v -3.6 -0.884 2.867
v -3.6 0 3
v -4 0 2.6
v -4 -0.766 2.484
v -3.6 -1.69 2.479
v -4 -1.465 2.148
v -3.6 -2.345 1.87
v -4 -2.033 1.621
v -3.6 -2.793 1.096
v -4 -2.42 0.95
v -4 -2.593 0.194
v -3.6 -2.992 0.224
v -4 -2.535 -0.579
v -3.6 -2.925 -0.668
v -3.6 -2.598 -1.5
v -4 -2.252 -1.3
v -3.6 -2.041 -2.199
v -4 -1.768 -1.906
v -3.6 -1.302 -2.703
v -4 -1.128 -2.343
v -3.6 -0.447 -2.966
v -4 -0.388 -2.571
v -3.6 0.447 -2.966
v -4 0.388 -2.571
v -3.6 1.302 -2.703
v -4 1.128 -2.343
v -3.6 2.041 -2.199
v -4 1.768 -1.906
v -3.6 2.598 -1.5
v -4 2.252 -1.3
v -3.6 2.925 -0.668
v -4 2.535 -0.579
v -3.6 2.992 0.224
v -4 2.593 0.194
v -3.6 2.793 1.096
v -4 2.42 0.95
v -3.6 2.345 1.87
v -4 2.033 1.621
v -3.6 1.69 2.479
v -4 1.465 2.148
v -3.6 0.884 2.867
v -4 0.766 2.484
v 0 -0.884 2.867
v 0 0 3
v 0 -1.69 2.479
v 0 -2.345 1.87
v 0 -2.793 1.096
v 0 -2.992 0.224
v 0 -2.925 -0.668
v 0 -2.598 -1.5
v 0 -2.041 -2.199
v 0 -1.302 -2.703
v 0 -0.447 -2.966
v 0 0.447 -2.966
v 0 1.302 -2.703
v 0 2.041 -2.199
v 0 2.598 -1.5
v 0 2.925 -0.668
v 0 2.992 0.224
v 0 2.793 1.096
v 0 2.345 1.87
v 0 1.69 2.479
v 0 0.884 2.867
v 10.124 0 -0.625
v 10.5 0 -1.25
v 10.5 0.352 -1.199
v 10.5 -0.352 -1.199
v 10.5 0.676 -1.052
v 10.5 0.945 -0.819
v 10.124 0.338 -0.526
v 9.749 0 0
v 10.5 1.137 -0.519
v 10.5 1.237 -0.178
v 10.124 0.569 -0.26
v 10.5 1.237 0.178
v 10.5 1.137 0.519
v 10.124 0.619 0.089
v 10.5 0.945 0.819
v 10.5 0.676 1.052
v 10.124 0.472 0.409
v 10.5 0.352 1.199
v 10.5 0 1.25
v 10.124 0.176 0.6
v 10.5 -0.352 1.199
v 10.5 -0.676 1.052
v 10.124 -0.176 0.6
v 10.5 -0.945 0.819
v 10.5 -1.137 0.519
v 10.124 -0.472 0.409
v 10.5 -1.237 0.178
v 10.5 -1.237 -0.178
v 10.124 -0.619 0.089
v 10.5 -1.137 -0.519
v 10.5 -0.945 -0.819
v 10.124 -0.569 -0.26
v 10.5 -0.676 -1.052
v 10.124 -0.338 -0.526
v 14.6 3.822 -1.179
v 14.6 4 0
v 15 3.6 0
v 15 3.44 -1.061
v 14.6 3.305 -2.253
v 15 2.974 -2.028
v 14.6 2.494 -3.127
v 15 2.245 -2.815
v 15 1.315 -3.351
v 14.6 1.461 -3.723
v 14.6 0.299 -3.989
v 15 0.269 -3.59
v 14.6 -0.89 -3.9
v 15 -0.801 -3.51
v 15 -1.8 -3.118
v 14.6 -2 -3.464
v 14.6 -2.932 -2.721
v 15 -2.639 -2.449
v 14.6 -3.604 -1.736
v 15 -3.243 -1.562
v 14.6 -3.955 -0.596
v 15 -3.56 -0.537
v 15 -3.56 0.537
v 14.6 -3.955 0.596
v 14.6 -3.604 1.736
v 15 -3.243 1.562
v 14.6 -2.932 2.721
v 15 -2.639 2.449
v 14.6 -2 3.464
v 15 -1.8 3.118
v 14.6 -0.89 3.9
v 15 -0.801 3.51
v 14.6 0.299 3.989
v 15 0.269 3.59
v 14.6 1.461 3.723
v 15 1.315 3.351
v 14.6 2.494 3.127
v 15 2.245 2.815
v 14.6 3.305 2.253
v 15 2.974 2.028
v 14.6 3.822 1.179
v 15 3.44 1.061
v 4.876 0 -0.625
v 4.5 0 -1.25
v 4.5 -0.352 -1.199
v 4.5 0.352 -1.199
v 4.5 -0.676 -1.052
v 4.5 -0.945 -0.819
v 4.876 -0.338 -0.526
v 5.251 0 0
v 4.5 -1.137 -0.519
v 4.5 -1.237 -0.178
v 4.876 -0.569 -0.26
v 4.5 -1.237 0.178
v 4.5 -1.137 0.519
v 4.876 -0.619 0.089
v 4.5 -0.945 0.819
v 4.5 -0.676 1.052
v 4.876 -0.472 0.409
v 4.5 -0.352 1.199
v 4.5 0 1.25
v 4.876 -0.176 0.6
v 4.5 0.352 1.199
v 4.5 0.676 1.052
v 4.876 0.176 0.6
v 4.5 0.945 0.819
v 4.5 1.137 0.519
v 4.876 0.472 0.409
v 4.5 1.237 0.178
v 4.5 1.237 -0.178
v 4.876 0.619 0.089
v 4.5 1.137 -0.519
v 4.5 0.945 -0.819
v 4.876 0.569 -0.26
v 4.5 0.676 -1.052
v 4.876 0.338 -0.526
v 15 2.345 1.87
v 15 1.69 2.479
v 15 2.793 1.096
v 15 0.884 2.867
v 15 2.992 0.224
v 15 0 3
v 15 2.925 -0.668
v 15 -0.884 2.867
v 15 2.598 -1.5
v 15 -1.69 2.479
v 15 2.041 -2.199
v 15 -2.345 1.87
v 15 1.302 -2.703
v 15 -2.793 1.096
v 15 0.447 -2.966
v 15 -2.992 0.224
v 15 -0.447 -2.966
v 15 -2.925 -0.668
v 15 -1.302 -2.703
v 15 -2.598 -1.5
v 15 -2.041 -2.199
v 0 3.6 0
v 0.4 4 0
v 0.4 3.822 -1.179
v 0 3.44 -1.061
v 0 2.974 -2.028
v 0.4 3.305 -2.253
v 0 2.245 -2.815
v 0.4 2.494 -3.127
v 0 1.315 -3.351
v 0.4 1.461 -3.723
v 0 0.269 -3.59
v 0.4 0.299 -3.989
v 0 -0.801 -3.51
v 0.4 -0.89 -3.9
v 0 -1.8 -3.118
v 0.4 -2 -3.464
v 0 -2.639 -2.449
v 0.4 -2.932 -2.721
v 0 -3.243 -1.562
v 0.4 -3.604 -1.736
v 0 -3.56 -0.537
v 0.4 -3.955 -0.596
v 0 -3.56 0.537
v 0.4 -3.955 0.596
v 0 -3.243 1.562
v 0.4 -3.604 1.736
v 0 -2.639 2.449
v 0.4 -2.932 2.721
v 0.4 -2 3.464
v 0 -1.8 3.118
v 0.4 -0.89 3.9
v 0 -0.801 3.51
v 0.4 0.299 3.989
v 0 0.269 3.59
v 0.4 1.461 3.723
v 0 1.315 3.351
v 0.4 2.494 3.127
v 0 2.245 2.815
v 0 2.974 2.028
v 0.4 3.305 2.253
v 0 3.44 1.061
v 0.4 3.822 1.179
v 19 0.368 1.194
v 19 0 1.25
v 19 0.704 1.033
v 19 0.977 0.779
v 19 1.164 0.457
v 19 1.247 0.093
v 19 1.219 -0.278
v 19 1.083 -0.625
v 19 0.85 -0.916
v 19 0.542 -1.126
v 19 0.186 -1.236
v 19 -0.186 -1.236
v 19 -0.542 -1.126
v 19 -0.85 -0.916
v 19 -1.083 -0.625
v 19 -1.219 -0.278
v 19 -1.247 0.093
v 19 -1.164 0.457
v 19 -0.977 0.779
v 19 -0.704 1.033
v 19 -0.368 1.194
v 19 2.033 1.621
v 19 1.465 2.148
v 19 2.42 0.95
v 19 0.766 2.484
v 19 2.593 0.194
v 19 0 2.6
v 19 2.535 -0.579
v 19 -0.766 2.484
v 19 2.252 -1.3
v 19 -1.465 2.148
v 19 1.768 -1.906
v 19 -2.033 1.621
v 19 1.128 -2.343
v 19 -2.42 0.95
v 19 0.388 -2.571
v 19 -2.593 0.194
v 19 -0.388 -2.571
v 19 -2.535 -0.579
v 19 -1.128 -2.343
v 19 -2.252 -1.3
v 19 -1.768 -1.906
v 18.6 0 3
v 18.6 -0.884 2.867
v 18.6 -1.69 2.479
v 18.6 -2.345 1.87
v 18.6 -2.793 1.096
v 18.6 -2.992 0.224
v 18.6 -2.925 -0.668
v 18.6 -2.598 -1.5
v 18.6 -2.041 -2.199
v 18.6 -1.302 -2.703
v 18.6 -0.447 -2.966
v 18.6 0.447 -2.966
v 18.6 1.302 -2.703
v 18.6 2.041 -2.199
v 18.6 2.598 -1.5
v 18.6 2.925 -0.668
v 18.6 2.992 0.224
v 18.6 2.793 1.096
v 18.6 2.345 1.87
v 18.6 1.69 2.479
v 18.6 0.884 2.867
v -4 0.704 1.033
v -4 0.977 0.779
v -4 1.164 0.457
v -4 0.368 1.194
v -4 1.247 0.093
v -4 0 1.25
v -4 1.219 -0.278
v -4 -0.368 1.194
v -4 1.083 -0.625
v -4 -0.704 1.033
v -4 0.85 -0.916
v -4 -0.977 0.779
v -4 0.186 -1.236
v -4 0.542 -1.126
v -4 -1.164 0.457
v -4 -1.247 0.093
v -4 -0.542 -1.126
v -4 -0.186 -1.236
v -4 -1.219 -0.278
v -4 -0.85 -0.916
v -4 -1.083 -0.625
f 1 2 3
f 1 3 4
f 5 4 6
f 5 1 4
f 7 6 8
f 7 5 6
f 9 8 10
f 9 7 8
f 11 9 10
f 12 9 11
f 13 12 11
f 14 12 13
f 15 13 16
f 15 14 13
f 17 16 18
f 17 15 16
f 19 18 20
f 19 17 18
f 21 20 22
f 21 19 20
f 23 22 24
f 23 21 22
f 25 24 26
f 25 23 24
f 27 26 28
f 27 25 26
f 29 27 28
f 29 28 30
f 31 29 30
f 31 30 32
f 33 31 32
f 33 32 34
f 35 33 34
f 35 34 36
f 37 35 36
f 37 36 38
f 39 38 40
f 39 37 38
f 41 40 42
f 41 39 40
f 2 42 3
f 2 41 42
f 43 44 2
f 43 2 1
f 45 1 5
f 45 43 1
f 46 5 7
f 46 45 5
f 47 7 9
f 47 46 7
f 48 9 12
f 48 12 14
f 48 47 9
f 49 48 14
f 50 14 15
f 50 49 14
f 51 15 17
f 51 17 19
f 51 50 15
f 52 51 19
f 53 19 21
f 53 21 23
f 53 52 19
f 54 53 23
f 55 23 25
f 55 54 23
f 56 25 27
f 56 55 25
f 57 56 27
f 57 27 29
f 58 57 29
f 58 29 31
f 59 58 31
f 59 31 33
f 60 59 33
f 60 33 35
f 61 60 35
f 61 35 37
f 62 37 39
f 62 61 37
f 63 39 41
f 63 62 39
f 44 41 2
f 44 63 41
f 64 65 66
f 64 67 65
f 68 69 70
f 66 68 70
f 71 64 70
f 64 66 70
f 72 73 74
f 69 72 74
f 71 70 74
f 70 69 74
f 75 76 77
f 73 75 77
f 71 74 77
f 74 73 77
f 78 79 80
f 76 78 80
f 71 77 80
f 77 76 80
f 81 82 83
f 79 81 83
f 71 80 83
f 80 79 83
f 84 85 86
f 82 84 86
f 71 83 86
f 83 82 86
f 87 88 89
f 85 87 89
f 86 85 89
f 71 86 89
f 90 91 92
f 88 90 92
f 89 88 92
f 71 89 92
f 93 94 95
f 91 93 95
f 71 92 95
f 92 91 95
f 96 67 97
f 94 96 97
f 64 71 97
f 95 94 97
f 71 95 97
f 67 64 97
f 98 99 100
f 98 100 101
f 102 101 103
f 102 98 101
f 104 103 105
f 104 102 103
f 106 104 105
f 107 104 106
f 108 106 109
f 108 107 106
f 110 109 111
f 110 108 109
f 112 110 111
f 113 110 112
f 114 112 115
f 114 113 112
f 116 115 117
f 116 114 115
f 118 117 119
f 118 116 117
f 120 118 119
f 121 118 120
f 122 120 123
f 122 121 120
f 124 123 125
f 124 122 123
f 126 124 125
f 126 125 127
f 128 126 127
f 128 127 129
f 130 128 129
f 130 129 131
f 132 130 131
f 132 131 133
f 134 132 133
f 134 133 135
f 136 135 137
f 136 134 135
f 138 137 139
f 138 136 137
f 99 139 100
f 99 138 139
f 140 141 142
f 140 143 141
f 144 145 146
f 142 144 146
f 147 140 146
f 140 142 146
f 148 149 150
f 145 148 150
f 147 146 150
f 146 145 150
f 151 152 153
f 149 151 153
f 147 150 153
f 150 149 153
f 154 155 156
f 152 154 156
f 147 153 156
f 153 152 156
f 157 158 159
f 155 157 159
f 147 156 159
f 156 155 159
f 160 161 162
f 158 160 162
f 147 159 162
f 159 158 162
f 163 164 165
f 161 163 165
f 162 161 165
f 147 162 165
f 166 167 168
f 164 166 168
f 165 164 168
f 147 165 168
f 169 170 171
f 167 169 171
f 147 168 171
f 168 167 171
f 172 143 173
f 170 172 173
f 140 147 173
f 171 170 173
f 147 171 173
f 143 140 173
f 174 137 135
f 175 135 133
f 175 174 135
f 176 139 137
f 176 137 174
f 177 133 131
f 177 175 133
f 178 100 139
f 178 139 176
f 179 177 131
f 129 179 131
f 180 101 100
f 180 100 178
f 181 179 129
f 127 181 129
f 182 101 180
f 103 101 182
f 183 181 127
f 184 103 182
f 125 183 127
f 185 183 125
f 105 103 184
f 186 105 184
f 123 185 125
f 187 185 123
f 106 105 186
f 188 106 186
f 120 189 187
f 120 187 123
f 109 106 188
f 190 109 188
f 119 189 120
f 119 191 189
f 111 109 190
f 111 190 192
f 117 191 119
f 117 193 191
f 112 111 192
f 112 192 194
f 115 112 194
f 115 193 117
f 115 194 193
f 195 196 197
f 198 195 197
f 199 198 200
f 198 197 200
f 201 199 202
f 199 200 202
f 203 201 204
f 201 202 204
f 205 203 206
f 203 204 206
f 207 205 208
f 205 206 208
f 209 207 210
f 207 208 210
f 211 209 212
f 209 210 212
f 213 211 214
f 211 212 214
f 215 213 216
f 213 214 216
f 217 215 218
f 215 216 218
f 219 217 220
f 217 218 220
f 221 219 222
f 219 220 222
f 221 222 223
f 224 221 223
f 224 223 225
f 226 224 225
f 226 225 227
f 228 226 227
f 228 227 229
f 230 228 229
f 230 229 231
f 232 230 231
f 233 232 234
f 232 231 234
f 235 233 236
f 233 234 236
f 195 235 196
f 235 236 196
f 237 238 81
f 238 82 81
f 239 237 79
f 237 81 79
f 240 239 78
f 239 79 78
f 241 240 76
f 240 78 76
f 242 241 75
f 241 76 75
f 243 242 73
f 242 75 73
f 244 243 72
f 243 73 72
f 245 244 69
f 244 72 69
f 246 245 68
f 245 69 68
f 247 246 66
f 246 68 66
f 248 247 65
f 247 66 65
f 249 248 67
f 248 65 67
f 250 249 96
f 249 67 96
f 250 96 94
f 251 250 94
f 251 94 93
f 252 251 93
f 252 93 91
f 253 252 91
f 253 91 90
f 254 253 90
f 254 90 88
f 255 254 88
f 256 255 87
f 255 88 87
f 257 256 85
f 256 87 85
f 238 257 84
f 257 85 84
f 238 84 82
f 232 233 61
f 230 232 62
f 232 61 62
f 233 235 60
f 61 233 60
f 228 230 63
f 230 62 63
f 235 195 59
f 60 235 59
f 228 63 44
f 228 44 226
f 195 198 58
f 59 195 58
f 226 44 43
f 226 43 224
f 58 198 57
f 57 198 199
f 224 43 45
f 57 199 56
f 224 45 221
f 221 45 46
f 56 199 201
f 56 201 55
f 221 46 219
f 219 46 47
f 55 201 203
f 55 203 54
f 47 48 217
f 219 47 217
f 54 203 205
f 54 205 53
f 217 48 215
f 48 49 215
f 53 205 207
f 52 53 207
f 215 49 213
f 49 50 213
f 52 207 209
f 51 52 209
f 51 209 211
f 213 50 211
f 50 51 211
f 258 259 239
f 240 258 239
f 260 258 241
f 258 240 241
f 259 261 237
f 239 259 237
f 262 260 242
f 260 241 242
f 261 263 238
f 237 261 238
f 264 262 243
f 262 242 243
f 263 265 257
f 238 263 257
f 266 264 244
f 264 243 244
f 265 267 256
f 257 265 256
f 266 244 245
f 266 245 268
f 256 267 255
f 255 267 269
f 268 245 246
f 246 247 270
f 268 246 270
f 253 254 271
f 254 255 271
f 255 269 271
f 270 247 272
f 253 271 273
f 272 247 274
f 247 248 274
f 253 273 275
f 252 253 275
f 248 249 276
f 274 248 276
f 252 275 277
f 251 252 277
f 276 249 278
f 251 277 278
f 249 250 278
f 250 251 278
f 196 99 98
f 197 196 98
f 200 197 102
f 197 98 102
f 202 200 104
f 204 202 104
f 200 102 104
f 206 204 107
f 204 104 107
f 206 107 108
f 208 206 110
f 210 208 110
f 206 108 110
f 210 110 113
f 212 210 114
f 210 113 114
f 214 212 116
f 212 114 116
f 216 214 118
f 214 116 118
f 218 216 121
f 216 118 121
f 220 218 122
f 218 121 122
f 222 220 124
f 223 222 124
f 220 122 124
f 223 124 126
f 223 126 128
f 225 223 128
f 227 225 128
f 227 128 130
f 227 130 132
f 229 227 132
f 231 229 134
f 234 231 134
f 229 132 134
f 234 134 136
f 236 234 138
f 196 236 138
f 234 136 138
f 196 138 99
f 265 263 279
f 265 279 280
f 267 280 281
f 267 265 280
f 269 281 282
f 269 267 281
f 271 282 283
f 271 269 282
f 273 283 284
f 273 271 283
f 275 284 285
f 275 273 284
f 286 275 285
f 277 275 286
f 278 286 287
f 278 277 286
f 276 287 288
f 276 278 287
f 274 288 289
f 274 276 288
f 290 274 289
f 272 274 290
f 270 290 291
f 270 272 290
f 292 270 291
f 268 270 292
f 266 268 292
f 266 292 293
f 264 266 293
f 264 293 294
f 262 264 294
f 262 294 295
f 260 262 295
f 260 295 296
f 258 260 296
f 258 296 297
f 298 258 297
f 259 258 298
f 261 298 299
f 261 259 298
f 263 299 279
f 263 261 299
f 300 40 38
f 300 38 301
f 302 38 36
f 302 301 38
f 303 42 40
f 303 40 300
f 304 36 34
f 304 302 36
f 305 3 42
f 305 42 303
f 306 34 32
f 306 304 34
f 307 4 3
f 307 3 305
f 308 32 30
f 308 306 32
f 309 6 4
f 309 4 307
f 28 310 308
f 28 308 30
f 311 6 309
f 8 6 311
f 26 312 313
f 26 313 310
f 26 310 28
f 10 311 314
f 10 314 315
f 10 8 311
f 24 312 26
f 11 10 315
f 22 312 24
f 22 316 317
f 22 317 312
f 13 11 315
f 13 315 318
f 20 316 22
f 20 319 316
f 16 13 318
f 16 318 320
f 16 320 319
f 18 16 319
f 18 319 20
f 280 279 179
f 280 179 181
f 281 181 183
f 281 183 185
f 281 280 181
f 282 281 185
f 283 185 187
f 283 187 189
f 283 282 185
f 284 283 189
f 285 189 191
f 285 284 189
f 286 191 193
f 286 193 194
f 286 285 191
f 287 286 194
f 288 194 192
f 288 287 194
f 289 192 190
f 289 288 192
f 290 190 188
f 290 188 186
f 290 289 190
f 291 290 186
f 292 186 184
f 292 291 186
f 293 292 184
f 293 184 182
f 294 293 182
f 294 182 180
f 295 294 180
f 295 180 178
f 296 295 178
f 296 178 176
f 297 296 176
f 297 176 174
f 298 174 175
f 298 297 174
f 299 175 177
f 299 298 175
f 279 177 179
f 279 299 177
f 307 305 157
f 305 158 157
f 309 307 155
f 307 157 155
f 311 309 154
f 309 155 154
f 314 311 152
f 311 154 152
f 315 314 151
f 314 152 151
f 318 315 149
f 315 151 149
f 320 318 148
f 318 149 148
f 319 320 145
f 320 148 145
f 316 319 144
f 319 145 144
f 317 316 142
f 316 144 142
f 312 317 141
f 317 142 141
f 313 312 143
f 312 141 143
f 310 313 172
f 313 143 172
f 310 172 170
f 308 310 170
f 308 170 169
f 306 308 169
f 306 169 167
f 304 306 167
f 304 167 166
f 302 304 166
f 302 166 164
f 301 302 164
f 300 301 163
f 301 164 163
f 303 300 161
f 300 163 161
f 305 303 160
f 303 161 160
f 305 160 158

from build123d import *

# Parameters (mm, degrees)
SKETCH1_W          = 15
SKETCH1_H          = 4
CHAMFER1_SIZE      = 0.4
SKETCH2_W          = 23
SKETCH2_H          = 3
TAPPED_HOLE1_D     = 2.5
TAPPED_HOLE1_DEPTH = 8.5
TAPPED_HOLE1_TIP   = 0.751075774
TAPPED_HOLE2_D     = 2.5
TAPPED_HOLE2_DEPTH = 8.5
TAPPED_HOLE2_TIP   = 0.751075774
CHAMFER2_SIZE      = 0.4
CHAMFER3_SIZE      = 0.4


with BuildPart() as part:
    # Sketch1 → Revolve1 (revolve)
    with BuildSketch(Plane.XY):
        with Locations((7.5, 2)):
            Rectangle(SKETCH1_W, SKETCH1_H)
    revolve(axis=Axis((15, 0, 0), (-1, 0, 0)))

    # Chamfer1
    chamfer1_edges = [part.edges().sort_by_distance(p)[0] for p in [
        (15, -4, 0),
        (0, -4, 0),
    ]]
    chamfer(chamfer1_edges, length=CHAMFER1_SIZE)

    # Sketch2 → Revolve2 (revolve)
    with BuildSketch(Plane.XY, mode=Mode.PRIVATE) as revolve2_sk:
        with Locations((7.5, 1.5)):
            Rectangle(SKETCH2_W, SKETCH2_H)
    revolve(revolve2_sk.sketch.rotate(Axis((-4, 0, 0), (1, 0, 0)), 90), axis=Axis((-4, 0, 0), (1, 0, 0)))

    # Tapped Hole1
    with Locations(Plane(origin=(-4, 0, 0), x_dir=(0, 0, -1), z_dir=(-1, 0, 0))):
        with Locations((0, 0)):
            Hole(TAPPED_HOLE1_D / 2, depth=TAPPED_HOLE1_DEPTH)
            with Locations((0, 0, -(TAPPED_HOLE1_DEPTH + TAPPED_HOLE1_TIP / 2))):  # 118° drill point
                Cone(0, TAPPED_HOLE1_D / 2, TAPPED_HOLE1_TIP, mode=Mode.SUBTRACT)

    # Tapped Hole2
    with Locations(Plane(origin=(19, 1.854743126, 0.460903034), x_dir=(0, 0, -1), z_dir=(1, 0, 0))):
        with Locations((0.460903034, -1.854743126)):
            Hole(TAPPED_HOLE2_D / 2, depth=TAPPED_HOLE2_DEPTH)
            with Locations((0, 0, -(TAPPED_HOLE2_DEPTH + TAPPED_HOLE2_TIP / 2))):  # 118° drill point
                Cone(0, TAPPED_HOLE2_D / 2, TAPPED_HOLE2_TIP, mode=Mode.SUBTRACT)

    # Chamfer2
    chamfer2_edges = [part.edges().sort_by_distance(p)[0] for p in [
        (-4, 0, -3),
    ]]
    chamfer(chamfer2_edges, length=CHAMFER2_SIZE)

    # Chamfer3
    chamfer3_edges = [part.edges().sort_by_distance(p)[0] for p in [
        (19, 0, -3),
    ]]
    chamfer(chamfer3_edges, length=CHAMFER3_SIZE)


solid = part.part
